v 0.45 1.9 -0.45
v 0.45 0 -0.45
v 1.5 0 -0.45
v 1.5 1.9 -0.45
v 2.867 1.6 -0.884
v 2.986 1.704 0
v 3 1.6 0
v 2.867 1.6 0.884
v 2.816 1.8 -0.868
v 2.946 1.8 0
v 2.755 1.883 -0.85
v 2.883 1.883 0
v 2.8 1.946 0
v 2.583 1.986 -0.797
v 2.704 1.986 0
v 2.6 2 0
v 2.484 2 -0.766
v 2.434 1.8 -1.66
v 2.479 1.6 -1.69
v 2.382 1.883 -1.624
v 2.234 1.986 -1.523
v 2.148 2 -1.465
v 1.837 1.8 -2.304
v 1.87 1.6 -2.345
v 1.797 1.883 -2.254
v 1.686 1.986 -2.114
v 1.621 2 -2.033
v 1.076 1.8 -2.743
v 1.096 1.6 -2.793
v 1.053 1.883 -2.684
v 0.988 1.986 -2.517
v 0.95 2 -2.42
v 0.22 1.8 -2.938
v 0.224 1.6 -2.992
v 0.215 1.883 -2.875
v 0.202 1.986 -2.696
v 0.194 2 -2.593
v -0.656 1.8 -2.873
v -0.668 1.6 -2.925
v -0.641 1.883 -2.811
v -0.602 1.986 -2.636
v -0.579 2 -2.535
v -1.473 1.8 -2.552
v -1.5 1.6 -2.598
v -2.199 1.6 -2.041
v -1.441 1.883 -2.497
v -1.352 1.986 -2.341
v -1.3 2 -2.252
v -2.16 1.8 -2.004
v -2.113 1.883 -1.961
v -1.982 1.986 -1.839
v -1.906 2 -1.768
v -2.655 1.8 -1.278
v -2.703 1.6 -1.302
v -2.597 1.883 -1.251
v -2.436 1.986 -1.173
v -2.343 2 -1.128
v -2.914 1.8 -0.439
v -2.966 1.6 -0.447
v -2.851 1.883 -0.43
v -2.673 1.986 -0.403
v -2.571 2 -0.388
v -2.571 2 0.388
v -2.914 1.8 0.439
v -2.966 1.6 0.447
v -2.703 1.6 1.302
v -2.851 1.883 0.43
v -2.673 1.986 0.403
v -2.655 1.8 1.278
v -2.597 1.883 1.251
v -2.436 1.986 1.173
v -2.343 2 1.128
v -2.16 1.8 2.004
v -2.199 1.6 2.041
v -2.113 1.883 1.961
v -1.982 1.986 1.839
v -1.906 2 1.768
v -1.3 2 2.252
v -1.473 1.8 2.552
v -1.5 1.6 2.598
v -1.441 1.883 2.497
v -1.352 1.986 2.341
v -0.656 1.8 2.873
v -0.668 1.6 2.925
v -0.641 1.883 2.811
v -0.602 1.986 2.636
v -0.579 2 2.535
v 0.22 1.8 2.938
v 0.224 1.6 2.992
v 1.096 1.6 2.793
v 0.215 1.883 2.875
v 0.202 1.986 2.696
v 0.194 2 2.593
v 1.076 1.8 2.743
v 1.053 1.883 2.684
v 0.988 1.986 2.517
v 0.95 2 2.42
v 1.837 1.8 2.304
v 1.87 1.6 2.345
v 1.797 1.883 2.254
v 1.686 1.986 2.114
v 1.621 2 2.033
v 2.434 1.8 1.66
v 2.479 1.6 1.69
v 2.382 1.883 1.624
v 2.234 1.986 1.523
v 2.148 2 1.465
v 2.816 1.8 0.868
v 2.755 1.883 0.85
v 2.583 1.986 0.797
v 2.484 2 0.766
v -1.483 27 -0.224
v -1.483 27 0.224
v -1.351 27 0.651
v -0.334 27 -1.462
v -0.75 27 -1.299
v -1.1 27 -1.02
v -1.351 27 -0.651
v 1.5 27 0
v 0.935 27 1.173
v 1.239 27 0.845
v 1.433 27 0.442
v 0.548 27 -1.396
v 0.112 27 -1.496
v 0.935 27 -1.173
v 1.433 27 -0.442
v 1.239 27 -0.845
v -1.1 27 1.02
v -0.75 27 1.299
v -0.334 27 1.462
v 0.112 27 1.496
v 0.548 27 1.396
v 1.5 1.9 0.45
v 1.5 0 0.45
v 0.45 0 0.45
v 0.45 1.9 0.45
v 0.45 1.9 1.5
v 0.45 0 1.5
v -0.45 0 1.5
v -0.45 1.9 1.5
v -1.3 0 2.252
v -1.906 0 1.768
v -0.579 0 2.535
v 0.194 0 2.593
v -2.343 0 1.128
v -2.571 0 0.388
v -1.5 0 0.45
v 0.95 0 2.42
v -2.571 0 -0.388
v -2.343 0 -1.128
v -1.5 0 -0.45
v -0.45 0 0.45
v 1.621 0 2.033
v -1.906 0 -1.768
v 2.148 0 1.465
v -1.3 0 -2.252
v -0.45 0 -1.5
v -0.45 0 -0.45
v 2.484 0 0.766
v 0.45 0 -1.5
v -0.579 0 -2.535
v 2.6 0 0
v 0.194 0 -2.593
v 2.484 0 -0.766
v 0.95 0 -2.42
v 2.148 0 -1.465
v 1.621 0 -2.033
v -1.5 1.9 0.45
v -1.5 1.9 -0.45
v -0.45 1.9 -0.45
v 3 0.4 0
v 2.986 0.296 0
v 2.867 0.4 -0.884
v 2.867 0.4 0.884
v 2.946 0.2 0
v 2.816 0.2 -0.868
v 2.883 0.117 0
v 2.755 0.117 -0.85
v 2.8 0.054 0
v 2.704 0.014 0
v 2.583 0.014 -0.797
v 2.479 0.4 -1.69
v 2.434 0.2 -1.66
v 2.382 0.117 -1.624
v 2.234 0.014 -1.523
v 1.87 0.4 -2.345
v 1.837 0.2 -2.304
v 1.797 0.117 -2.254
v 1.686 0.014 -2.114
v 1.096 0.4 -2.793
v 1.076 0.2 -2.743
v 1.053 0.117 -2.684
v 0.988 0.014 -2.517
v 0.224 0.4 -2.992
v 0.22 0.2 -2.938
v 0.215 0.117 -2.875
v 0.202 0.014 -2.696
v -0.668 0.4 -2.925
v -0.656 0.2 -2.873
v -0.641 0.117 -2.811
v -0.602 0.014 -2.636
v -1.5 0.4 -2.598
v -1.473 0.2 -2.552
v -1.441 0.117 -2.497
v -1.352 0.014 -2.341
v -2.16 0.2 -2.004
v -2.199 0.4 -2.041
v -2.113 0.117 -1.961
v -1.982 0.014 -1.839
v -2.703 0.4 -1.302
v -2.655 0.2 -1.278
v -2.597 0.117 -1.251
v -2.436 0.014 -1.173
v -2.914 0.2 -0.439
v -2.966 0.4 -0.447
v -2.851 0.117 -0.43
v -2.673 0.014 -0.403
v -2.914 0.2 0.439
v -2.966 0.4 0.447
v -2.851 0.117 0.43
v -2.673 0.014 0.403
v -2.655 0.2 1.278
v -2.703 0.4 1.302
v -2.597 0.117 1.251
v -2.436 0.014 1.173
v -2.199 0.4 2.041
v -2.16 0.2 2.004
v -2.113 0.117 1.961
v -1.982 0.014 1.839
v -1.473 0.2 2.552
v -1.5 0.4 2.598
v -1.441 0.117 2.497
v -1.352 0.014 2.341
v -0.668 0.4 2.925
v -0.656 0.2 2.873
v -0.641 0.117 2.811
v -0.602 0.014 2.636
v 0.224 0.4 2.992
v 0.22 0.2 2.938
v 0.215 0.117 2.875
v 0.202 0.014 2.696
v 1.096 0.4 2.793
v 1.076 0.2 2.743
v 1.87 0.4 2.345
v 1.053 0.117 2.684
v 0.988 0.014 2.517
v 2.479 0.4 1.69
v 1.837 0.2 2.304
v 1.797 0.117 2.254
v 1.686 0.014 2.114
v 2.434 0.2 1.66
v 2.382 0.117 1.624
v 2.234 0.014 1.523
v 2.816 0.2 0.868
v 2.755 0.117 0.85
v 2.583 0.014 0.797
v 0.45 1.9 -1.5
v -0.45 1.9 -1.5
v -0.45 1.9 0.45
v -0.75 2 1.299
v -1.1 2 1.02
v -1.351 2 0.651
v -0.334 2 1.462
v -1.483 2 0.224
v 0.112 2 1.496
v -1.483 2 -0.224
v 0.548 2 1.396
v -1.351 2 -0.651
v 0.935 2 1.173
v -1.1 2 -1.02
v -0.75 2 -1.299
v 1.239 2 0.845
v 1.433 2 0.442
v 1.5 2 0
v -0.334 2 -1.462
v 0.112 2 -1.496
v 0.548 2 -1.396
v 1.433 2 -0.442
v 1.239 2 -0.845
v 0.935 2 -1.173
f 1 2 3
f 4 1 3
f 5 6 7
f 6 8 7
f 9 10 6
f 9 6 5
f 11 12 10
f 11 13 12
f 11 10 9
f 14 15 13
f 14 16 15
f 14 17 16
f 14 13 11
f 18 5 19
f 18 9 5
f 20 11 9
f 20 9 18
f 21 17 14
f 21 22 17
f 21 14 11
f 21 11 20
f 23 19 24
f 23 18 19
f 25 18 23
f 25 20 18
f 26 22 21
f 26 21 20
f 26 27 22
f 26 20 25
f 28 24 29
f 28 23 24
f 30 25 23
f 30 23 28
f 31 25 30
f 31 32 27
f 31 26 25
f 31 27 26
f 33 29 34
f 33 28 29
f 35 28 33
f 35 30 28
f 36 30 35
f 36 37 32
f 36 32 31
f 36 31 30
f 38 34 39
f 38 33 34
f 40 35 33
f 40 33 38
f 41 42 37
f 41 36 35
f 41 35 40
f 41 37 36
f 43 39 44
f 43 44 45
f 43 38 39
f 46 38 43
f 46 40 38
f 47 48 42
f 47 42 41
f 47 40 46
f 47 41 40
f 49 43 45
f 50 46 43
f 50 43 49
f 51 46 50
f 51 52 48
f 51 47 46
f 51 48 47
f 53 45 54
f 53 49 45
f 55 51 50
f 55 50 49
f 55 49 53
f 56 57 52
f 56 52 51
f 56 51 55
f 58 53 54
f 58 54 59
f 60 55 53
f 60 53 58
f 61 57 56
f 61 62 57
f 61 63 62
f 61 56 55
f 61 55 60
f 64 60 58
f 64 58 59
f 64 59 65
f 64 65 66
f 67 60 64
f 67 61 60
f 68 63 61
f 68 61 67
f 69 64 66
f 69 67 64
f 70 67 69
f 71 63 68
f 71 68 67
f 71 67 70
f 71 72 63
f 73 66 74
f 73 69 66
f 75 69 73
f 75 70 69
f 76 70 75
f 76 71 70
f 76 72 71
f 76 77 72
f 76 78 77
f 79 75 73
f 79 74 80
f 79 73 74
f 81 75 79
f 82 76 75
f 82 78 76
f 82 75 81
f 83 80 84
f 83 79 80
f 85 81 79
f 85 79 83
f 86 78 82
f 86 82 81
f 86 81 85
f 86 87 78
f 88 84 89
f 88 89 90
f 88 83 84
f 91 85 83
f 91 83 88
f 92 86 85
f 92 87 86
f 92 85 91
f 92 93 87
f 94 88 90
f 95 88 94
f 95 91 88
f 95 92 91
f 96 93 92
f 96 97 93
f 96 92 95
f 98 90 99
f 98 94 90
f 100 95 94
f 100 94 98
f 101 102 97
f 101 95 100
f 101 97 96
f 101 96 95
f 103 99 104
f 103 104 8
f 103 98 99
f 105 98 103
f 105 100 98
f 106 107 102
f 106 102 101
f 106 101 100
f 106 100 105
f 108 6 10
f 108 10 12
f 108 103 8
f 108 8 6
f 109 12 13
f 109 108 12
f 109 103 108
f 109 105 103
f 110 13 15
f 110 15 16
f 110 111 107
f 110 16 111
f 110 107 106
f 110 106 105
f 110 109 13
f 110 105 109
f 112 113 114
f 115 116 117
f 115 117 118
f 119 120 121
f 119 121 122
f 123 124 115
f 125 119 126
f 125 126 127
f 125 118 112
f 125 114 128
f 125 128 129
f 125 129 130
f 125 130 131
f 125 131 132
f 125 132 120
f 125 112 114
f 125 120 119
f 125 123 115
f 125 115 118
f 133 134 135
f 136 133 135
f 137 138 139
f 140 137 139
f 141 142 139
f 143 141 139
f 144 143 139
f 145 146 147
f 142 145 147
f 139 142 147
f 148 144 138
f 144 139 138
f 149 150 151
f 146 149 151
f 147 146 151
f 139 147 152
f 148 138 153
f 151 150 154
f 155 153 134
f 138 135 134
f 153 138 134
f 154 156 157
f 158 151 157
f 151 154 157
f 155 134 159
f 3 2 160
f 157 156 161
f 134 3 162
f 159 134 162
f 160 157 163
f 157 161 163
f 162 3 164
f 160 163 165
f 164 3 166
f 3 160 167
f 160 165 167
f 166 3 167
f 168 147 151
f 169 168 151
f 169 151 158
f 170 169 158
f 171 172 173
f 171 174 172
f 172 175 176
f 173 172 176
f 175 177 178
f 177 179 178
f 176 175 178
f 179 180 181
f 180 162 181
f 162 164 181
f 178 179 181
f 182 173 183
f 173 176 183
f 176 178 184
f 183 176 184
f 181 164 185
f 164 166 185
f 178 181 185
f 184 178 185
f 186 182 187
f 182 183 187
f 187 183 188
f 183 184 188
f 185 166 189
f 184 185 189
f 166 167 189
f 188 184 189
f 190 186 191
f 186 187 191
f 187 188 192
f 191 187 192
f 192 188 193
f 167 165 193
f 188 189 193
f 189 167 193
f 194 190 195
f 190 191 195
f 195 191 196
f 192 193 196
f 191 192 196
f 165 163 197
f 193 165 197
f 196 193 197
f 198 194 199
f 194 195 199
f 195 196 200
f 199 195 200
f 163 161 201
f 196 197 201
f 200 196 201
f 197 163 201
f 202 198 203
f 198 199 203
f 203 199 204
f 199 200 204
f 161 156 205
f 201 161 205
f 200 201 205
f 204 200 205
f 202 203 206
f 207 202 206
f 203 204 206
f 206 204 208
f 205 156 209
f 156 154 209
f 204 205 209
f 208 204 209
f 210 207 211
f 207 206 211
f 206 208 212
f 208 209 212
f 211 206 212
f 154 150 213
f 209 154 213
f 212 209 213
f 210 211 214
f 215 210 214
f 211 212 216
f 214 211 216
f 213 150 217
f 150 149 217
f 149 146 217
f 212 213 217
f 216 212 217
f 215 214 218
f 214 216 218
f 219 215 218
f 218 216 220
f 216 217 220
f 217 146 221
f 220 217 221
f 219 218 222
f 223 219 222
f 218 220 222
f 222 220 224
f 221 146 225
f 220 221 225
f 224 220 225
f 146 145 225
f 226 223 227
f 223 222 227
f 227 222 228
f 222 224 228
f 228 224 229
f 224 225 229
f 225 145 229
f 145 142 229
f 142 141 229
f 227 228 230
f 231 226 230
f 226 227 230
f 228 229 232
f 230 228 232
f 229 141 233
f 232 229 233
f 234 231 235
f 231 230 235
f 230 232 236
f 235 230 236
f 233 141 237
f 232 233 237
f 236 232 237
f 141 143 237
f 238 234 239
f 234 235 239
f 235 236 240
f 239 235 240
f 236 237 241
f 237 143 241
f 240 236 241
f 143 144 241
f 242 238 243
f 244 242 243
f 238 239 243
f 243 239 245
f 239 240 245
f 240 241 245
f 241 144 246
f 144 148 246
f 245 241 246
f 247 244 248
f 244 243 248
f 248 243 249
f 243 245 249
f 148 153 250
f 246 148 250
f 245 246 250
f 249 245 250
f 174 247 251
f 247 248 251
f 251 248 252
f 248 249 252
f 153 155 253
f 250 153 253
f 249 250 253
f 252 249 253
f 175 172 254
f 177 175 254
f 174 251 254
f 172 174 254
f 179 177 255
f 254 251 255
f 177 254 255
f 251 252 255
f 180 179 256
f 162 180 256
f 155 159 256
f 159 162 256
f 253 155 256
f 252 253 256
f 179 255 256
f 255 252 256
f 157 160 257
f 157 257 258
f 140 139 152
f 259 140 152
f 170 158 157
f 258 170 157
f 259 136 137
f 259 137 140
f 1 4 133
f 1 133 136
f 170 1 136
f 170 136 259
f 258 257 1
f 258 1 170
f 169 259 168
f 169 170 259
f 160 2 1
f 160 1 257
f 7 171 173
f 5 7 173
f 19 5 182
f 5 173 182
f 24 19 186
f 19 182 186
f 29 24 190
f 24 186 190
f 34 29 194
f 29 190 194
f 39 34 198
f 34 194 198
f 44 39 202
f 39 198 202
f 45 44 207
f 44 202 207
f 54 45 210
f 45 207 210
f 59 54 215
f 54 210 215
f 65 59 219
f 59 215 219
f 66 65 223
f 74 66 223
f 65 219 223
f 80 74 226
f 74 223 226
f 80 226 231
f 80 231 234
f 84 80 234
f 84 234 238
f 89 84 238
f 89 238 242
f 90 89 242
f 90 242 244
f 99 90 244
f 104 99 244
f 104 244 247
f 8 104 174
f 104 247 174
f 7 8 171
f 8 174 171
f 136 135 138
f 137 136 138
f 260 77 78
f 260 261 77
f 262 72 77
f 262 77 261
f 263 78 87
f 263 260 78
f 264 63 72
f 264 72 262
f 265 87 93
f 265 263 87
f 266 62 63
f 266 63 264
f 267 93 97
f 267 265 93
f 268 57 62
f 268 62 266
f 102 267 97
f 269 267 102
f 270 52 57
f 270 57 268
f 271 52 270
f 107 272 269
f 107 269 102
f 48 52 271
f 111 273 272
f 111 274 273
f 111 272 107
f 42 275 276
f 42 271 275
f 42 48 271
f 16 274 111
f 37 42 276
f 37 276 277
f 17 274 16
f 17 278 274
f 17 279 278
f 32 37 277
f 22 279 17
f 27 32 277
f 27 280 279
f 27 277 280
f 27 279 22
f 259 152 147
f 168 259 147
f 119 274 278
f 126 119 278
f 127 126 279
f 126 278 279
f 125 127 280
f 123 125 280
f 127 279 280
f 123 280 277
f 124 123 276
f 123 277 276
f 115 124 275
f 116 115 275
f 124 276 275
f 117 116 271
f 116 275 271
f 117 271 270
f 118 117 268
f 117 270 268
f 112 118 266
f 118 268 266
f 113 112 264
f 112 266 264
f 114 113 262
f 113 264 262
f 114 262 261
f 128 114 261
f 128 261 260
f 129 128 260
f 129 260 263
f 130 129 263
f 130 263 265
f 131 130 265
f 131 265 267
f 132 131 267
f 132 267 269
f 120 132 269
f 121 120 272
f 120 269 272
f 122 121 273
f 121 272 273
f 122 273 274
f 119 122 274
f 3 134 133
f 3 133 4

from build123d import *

# Parameters (mm, degrees)
SKETCH1_R           = 3
BOSS_EXTRUDE1_DEPTH = 2
SKETCH2_R           = 1.5
BOSS_EXTRUDE2_DEPTH = 25
SKETCH3_W           = 0.9
SKETCH3_H           = 0.9
SKETCH3_W_2         = 1.05
SKETCH3_H_2         = 1.05
CUT_EXTRUDE1_DEPTH  = 1.9
FILLET1_R           = 0.4


with BuildPart() as part:
    # Sketch1 → Boss-Extrude1 (new body)
    with BuildSketch(Plane(origin=(0, 0, 0), x_dir=(1, 0, 0), z_dir=(0, 1, 0))):
        Circle(SKETCH1_R)
    extrude(amount=BOSS_EXTRUDE1_DEPTH)

    # Sketch2 → Boss-Extrude2 (add)
    with BuildSketch(Plane(origin=(0, 2, 0), x_dir=(1, 0, 0), z_dir=(0, 1, 0))):
        Circle(SKETCH2_R)
    extrude(amount=BOSS_EXTRUDE2_DEPTH)

    # Sketch3 → Cut-Extrude1 (cut)
    with BuildSketch(Plane(origin=(0, 0, 0), x_dir=(-1, 0, 0), z_dir=(0, -1, 0))):
        Rectangle(SKETCH3_W, SKETCH3_H)
        with Locations((0.975, 0)):
            Rectangle(SKETCH3_W_2, SKETCH3_H)
        with Locations((0, -0.975)):
            Rectangle(SKETCH3_W, SKETCH3_H_2)
        with Locations((-0.975, 0)):
            Rectangle(SKETCH3_W_2, SKETCH3_H)
        with Locations((0, 0.975)):
            Rectangle(SKETCH3_W, SKETCH3_H_2)
    extrude(amount=-CUT_EXTRUDE1_DEPTH, mode=Mode.SUBTRACT)

    # Fillet1
    fillet1_edges = [part.edges().sort_by_distance(p)[0] for p in [
        (-3, 0, 0),
        (-3, 2, 0),
    ]]
    fillet(fillet1_edges, radius=FILLET1_R)


solid = part.part
